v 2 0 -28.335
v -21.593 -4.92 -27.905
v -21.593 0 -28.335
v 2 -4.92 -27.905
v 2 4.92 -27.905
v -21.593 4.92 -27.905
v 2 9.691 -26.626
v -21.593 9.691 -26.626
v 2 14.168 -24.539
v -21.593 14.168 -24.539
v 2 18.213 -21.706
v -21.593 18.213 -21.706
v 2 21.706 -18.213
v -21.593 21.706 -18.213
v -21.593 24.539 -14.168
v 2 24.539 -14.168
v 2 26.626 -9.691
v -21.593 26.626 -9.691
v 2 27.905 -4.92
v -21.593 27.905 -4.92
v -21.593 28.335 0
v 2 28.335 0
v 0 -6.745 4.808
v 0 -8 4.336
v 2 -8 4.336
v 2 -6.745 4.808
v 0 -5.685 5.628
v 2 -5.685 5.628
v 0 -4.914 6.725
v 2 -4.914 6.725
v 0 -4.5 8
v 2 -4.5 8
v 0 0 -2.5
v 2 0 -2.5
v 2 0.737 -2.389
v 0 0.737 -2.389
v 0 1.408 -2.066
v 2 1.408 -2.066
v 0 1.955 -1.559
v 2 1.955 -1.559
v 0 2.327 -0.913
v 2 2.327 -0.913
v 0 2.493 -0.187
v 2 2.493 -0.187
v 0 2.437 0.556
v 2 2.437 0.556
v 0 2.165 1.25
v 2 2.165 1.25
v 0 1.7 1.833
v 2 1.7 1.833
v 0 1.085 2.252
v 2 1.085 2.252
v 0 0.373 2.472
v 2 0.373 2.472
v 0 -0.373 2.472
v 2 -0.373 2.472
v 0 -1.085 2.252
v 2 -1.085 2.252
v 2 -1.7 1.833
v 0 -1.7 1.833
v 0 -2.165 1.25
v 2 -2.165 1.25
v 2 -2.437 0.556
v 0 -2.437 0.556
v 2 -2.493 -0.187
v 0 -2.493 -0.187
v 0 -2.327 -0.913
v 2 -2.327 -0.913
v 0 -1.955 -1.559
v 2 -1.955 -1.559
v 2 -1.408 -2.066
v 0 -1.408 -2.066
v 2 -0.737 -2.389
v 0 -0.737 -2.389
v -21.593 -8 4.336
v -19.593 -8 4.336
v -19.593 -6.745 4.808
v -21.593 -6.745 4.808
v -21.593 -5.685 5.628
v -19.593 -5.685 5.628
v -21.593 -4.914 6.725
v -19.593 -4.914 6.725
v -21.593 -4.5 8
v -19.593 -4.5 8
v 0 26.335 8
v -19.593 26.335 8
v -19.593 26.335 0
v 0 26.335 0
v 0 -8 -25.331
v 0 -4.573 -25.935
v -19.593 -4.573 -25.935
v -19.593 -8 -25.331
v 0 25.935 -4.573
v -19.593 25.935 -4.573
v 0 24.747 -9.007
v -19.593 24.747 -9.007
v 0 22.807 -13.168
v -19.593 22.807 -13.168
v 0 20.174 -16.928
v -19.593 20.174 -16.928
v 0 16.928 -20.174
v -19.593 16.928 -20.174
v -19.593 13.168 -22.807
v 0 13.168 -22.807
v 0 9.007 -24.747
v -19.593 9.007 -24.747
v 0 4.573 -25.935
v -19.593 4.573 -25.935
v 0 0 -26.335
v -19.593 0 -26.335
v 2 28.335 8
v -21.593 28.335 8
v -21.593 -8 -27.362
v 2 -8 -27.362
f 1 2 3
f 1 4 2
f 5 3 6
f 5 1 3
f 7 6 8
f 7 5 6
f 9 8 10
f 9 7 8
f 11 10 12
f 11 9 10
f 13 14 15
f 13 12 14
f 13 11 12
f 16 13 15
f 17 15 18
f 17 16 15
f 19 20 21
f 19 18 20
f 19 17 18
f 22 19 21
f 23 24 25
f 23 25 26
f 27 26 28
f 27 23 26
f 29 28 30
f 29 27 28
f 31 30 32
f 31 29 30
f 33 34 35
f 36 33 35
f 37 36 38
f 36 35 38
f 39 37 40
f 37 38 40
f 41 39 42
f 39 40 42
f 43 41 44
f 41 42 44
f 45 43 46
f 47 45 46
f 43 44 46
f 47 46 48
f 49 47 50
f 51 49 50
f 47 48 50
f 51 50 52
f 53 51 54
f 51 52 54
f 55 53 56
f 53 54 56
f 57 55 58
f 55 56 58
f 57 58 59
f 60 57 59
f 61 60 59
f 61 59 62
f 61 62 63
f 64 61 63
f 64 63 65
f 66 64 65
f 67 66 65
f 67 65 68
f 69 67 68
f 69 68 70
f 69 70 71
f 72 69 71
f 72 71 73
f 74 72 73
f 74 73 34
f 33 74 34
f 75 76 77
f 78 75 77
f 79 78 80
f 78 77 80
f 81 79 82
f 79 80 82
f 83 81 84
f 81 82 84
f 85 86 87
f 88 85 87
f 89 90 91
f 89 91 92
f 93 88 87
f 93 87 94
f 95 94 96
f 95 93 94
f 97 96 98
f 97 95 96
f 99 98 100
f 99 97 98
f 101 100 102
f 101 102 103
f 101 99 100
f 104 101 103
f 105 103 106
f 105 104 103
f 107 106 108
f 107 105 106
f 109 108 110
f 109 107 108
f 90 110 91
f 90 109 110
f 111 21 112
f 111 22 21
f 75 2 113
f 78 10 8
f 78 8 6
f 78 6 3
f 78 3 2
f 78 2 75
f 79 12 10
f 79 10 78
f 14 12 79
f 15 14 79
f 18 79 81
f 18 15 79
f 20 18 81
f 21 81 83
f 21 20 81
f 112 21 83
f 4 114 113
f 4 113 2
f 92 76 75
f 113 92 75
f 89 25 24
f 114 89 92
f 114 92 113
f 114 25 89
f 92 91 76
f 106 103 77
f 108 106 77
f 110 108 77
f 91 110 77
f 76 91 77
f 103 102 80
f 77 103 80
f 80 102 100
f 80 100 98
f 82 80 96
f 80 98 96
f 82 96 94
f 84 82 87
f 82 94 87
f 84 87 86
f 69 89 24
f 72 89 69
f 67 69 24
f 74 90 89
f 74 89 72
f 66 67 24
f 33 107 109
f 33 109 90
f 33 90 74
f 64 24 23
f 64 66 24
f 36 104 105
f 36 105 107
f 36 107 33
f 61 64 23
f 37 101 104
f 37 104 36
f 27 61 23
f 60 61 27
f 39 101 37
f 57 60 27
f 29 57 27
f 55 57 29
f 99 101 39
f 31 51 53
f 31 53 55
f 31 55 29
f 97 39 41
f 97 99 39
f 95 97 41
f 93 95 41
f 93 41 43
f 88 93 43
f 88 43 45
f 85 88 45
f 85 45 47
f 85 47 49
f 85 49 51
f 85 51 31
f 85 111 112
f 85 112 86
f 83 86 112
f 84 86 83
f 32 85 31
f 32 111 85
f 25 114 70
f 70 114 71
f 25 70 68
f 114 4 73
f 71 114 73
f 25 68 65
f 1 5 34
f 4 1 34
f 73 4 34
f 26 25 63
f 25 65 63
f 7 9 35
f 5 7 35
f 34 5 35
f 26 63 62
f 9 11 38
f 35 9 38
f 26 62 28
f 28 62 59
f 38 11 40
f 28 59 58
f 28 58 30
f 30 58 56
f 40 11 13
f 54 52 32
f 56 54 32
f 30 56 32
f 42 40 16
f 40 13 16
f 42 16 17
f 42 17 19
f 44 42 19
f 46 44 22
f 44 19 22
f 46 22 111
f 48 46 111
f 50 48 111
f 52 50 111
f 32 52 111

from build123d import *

# Parameters (mm, degrees)
BOSS_EXTRUDE1_DEPTH = 2
BOSS_EXTRUDE2_START = 9.79671523
BOSS_EXTRUDE2_DEPTH = 9.79671523
SKETCH4_R           = 2.5
CUT_EXTRUDE5_DEPTH  = 13


with BuildPart() as part:
    # Sketch1 → Boss-Extrude1 (new body)
    with BuildSketch(Plane(origin=(0, 0, 0), x_dir=(0, 0, -1), z_dir=(1, 0, 0))):
        with BuildLine():
            Line((-8, -4.5), (-8, 28.33511482))
            Line((-8, 28.33511482), (0, 28.33511482))
            ThreePointArc((0, 28.33511482), (21.705957253, 18.213460725), (27.904640757, -4.920341052))
            Line((27.904640757, -4.920341052), (27.361613793, -8))
            Line((27.361613793, -8), (-4.335665421, -8))
            ThreePointArc((-4.335665421, -8), (-5.628363986, -5.685201742), (-8, -4.5))
        make_face()
    extrude(amount=BOSS_EXTRUDE1_DEPTH)

    # Sketch6 → Boss-Extrude2 (add)
    with BuildSketch(Plane.ZY.offset(BOSS_EXTRUDE2_START)):
        with BuildLine():
            Line((8, 26.33511482), (0, 26.33511482))
            ThreePointArc((0, 26.33511482), (-20.173868367, 16.927885506), (-25.935025251, -4.573044697))
            Line((-25.935025251, -4.573044697), (-25.33076057, -8))
            Line((-25.33076057, -8), (-27.361613793, -8))
            Line((-27.361613793, -8), (-27.904640757, -4.920341052))
            ThreePointArc((-27.904640757, -4.920341052), (-21.705957253, 18.213460725), (0, 28.33511482))
            Line((0, 28.33511482), (8, 28.33511482))
            Line((8, 28.33511482), (8, 26.33511482))
        make_face()
    extrude(amount=-BOSS_EXTRUDE2_DEPTH)

    # Mirror1: part across plane


with BuildPart() as part_1:
    add(part.part)
    add(part.part.mirror(Plane.ZY.offset(9.79671523)))

    # Sketch4 → Cut-Extrude5 (cut)
    with BuildSketch(Plane(origin=(2, 0, 0), x_dir=(0, 0, -1), z_dir=(1, 0, 0))):
        Circle(SKETCH4_R)
    extrude(amount=-CUT_EXTRUDE5_DEPTH, mode=Mode.SUBTRACT)


solid = part_1.part
